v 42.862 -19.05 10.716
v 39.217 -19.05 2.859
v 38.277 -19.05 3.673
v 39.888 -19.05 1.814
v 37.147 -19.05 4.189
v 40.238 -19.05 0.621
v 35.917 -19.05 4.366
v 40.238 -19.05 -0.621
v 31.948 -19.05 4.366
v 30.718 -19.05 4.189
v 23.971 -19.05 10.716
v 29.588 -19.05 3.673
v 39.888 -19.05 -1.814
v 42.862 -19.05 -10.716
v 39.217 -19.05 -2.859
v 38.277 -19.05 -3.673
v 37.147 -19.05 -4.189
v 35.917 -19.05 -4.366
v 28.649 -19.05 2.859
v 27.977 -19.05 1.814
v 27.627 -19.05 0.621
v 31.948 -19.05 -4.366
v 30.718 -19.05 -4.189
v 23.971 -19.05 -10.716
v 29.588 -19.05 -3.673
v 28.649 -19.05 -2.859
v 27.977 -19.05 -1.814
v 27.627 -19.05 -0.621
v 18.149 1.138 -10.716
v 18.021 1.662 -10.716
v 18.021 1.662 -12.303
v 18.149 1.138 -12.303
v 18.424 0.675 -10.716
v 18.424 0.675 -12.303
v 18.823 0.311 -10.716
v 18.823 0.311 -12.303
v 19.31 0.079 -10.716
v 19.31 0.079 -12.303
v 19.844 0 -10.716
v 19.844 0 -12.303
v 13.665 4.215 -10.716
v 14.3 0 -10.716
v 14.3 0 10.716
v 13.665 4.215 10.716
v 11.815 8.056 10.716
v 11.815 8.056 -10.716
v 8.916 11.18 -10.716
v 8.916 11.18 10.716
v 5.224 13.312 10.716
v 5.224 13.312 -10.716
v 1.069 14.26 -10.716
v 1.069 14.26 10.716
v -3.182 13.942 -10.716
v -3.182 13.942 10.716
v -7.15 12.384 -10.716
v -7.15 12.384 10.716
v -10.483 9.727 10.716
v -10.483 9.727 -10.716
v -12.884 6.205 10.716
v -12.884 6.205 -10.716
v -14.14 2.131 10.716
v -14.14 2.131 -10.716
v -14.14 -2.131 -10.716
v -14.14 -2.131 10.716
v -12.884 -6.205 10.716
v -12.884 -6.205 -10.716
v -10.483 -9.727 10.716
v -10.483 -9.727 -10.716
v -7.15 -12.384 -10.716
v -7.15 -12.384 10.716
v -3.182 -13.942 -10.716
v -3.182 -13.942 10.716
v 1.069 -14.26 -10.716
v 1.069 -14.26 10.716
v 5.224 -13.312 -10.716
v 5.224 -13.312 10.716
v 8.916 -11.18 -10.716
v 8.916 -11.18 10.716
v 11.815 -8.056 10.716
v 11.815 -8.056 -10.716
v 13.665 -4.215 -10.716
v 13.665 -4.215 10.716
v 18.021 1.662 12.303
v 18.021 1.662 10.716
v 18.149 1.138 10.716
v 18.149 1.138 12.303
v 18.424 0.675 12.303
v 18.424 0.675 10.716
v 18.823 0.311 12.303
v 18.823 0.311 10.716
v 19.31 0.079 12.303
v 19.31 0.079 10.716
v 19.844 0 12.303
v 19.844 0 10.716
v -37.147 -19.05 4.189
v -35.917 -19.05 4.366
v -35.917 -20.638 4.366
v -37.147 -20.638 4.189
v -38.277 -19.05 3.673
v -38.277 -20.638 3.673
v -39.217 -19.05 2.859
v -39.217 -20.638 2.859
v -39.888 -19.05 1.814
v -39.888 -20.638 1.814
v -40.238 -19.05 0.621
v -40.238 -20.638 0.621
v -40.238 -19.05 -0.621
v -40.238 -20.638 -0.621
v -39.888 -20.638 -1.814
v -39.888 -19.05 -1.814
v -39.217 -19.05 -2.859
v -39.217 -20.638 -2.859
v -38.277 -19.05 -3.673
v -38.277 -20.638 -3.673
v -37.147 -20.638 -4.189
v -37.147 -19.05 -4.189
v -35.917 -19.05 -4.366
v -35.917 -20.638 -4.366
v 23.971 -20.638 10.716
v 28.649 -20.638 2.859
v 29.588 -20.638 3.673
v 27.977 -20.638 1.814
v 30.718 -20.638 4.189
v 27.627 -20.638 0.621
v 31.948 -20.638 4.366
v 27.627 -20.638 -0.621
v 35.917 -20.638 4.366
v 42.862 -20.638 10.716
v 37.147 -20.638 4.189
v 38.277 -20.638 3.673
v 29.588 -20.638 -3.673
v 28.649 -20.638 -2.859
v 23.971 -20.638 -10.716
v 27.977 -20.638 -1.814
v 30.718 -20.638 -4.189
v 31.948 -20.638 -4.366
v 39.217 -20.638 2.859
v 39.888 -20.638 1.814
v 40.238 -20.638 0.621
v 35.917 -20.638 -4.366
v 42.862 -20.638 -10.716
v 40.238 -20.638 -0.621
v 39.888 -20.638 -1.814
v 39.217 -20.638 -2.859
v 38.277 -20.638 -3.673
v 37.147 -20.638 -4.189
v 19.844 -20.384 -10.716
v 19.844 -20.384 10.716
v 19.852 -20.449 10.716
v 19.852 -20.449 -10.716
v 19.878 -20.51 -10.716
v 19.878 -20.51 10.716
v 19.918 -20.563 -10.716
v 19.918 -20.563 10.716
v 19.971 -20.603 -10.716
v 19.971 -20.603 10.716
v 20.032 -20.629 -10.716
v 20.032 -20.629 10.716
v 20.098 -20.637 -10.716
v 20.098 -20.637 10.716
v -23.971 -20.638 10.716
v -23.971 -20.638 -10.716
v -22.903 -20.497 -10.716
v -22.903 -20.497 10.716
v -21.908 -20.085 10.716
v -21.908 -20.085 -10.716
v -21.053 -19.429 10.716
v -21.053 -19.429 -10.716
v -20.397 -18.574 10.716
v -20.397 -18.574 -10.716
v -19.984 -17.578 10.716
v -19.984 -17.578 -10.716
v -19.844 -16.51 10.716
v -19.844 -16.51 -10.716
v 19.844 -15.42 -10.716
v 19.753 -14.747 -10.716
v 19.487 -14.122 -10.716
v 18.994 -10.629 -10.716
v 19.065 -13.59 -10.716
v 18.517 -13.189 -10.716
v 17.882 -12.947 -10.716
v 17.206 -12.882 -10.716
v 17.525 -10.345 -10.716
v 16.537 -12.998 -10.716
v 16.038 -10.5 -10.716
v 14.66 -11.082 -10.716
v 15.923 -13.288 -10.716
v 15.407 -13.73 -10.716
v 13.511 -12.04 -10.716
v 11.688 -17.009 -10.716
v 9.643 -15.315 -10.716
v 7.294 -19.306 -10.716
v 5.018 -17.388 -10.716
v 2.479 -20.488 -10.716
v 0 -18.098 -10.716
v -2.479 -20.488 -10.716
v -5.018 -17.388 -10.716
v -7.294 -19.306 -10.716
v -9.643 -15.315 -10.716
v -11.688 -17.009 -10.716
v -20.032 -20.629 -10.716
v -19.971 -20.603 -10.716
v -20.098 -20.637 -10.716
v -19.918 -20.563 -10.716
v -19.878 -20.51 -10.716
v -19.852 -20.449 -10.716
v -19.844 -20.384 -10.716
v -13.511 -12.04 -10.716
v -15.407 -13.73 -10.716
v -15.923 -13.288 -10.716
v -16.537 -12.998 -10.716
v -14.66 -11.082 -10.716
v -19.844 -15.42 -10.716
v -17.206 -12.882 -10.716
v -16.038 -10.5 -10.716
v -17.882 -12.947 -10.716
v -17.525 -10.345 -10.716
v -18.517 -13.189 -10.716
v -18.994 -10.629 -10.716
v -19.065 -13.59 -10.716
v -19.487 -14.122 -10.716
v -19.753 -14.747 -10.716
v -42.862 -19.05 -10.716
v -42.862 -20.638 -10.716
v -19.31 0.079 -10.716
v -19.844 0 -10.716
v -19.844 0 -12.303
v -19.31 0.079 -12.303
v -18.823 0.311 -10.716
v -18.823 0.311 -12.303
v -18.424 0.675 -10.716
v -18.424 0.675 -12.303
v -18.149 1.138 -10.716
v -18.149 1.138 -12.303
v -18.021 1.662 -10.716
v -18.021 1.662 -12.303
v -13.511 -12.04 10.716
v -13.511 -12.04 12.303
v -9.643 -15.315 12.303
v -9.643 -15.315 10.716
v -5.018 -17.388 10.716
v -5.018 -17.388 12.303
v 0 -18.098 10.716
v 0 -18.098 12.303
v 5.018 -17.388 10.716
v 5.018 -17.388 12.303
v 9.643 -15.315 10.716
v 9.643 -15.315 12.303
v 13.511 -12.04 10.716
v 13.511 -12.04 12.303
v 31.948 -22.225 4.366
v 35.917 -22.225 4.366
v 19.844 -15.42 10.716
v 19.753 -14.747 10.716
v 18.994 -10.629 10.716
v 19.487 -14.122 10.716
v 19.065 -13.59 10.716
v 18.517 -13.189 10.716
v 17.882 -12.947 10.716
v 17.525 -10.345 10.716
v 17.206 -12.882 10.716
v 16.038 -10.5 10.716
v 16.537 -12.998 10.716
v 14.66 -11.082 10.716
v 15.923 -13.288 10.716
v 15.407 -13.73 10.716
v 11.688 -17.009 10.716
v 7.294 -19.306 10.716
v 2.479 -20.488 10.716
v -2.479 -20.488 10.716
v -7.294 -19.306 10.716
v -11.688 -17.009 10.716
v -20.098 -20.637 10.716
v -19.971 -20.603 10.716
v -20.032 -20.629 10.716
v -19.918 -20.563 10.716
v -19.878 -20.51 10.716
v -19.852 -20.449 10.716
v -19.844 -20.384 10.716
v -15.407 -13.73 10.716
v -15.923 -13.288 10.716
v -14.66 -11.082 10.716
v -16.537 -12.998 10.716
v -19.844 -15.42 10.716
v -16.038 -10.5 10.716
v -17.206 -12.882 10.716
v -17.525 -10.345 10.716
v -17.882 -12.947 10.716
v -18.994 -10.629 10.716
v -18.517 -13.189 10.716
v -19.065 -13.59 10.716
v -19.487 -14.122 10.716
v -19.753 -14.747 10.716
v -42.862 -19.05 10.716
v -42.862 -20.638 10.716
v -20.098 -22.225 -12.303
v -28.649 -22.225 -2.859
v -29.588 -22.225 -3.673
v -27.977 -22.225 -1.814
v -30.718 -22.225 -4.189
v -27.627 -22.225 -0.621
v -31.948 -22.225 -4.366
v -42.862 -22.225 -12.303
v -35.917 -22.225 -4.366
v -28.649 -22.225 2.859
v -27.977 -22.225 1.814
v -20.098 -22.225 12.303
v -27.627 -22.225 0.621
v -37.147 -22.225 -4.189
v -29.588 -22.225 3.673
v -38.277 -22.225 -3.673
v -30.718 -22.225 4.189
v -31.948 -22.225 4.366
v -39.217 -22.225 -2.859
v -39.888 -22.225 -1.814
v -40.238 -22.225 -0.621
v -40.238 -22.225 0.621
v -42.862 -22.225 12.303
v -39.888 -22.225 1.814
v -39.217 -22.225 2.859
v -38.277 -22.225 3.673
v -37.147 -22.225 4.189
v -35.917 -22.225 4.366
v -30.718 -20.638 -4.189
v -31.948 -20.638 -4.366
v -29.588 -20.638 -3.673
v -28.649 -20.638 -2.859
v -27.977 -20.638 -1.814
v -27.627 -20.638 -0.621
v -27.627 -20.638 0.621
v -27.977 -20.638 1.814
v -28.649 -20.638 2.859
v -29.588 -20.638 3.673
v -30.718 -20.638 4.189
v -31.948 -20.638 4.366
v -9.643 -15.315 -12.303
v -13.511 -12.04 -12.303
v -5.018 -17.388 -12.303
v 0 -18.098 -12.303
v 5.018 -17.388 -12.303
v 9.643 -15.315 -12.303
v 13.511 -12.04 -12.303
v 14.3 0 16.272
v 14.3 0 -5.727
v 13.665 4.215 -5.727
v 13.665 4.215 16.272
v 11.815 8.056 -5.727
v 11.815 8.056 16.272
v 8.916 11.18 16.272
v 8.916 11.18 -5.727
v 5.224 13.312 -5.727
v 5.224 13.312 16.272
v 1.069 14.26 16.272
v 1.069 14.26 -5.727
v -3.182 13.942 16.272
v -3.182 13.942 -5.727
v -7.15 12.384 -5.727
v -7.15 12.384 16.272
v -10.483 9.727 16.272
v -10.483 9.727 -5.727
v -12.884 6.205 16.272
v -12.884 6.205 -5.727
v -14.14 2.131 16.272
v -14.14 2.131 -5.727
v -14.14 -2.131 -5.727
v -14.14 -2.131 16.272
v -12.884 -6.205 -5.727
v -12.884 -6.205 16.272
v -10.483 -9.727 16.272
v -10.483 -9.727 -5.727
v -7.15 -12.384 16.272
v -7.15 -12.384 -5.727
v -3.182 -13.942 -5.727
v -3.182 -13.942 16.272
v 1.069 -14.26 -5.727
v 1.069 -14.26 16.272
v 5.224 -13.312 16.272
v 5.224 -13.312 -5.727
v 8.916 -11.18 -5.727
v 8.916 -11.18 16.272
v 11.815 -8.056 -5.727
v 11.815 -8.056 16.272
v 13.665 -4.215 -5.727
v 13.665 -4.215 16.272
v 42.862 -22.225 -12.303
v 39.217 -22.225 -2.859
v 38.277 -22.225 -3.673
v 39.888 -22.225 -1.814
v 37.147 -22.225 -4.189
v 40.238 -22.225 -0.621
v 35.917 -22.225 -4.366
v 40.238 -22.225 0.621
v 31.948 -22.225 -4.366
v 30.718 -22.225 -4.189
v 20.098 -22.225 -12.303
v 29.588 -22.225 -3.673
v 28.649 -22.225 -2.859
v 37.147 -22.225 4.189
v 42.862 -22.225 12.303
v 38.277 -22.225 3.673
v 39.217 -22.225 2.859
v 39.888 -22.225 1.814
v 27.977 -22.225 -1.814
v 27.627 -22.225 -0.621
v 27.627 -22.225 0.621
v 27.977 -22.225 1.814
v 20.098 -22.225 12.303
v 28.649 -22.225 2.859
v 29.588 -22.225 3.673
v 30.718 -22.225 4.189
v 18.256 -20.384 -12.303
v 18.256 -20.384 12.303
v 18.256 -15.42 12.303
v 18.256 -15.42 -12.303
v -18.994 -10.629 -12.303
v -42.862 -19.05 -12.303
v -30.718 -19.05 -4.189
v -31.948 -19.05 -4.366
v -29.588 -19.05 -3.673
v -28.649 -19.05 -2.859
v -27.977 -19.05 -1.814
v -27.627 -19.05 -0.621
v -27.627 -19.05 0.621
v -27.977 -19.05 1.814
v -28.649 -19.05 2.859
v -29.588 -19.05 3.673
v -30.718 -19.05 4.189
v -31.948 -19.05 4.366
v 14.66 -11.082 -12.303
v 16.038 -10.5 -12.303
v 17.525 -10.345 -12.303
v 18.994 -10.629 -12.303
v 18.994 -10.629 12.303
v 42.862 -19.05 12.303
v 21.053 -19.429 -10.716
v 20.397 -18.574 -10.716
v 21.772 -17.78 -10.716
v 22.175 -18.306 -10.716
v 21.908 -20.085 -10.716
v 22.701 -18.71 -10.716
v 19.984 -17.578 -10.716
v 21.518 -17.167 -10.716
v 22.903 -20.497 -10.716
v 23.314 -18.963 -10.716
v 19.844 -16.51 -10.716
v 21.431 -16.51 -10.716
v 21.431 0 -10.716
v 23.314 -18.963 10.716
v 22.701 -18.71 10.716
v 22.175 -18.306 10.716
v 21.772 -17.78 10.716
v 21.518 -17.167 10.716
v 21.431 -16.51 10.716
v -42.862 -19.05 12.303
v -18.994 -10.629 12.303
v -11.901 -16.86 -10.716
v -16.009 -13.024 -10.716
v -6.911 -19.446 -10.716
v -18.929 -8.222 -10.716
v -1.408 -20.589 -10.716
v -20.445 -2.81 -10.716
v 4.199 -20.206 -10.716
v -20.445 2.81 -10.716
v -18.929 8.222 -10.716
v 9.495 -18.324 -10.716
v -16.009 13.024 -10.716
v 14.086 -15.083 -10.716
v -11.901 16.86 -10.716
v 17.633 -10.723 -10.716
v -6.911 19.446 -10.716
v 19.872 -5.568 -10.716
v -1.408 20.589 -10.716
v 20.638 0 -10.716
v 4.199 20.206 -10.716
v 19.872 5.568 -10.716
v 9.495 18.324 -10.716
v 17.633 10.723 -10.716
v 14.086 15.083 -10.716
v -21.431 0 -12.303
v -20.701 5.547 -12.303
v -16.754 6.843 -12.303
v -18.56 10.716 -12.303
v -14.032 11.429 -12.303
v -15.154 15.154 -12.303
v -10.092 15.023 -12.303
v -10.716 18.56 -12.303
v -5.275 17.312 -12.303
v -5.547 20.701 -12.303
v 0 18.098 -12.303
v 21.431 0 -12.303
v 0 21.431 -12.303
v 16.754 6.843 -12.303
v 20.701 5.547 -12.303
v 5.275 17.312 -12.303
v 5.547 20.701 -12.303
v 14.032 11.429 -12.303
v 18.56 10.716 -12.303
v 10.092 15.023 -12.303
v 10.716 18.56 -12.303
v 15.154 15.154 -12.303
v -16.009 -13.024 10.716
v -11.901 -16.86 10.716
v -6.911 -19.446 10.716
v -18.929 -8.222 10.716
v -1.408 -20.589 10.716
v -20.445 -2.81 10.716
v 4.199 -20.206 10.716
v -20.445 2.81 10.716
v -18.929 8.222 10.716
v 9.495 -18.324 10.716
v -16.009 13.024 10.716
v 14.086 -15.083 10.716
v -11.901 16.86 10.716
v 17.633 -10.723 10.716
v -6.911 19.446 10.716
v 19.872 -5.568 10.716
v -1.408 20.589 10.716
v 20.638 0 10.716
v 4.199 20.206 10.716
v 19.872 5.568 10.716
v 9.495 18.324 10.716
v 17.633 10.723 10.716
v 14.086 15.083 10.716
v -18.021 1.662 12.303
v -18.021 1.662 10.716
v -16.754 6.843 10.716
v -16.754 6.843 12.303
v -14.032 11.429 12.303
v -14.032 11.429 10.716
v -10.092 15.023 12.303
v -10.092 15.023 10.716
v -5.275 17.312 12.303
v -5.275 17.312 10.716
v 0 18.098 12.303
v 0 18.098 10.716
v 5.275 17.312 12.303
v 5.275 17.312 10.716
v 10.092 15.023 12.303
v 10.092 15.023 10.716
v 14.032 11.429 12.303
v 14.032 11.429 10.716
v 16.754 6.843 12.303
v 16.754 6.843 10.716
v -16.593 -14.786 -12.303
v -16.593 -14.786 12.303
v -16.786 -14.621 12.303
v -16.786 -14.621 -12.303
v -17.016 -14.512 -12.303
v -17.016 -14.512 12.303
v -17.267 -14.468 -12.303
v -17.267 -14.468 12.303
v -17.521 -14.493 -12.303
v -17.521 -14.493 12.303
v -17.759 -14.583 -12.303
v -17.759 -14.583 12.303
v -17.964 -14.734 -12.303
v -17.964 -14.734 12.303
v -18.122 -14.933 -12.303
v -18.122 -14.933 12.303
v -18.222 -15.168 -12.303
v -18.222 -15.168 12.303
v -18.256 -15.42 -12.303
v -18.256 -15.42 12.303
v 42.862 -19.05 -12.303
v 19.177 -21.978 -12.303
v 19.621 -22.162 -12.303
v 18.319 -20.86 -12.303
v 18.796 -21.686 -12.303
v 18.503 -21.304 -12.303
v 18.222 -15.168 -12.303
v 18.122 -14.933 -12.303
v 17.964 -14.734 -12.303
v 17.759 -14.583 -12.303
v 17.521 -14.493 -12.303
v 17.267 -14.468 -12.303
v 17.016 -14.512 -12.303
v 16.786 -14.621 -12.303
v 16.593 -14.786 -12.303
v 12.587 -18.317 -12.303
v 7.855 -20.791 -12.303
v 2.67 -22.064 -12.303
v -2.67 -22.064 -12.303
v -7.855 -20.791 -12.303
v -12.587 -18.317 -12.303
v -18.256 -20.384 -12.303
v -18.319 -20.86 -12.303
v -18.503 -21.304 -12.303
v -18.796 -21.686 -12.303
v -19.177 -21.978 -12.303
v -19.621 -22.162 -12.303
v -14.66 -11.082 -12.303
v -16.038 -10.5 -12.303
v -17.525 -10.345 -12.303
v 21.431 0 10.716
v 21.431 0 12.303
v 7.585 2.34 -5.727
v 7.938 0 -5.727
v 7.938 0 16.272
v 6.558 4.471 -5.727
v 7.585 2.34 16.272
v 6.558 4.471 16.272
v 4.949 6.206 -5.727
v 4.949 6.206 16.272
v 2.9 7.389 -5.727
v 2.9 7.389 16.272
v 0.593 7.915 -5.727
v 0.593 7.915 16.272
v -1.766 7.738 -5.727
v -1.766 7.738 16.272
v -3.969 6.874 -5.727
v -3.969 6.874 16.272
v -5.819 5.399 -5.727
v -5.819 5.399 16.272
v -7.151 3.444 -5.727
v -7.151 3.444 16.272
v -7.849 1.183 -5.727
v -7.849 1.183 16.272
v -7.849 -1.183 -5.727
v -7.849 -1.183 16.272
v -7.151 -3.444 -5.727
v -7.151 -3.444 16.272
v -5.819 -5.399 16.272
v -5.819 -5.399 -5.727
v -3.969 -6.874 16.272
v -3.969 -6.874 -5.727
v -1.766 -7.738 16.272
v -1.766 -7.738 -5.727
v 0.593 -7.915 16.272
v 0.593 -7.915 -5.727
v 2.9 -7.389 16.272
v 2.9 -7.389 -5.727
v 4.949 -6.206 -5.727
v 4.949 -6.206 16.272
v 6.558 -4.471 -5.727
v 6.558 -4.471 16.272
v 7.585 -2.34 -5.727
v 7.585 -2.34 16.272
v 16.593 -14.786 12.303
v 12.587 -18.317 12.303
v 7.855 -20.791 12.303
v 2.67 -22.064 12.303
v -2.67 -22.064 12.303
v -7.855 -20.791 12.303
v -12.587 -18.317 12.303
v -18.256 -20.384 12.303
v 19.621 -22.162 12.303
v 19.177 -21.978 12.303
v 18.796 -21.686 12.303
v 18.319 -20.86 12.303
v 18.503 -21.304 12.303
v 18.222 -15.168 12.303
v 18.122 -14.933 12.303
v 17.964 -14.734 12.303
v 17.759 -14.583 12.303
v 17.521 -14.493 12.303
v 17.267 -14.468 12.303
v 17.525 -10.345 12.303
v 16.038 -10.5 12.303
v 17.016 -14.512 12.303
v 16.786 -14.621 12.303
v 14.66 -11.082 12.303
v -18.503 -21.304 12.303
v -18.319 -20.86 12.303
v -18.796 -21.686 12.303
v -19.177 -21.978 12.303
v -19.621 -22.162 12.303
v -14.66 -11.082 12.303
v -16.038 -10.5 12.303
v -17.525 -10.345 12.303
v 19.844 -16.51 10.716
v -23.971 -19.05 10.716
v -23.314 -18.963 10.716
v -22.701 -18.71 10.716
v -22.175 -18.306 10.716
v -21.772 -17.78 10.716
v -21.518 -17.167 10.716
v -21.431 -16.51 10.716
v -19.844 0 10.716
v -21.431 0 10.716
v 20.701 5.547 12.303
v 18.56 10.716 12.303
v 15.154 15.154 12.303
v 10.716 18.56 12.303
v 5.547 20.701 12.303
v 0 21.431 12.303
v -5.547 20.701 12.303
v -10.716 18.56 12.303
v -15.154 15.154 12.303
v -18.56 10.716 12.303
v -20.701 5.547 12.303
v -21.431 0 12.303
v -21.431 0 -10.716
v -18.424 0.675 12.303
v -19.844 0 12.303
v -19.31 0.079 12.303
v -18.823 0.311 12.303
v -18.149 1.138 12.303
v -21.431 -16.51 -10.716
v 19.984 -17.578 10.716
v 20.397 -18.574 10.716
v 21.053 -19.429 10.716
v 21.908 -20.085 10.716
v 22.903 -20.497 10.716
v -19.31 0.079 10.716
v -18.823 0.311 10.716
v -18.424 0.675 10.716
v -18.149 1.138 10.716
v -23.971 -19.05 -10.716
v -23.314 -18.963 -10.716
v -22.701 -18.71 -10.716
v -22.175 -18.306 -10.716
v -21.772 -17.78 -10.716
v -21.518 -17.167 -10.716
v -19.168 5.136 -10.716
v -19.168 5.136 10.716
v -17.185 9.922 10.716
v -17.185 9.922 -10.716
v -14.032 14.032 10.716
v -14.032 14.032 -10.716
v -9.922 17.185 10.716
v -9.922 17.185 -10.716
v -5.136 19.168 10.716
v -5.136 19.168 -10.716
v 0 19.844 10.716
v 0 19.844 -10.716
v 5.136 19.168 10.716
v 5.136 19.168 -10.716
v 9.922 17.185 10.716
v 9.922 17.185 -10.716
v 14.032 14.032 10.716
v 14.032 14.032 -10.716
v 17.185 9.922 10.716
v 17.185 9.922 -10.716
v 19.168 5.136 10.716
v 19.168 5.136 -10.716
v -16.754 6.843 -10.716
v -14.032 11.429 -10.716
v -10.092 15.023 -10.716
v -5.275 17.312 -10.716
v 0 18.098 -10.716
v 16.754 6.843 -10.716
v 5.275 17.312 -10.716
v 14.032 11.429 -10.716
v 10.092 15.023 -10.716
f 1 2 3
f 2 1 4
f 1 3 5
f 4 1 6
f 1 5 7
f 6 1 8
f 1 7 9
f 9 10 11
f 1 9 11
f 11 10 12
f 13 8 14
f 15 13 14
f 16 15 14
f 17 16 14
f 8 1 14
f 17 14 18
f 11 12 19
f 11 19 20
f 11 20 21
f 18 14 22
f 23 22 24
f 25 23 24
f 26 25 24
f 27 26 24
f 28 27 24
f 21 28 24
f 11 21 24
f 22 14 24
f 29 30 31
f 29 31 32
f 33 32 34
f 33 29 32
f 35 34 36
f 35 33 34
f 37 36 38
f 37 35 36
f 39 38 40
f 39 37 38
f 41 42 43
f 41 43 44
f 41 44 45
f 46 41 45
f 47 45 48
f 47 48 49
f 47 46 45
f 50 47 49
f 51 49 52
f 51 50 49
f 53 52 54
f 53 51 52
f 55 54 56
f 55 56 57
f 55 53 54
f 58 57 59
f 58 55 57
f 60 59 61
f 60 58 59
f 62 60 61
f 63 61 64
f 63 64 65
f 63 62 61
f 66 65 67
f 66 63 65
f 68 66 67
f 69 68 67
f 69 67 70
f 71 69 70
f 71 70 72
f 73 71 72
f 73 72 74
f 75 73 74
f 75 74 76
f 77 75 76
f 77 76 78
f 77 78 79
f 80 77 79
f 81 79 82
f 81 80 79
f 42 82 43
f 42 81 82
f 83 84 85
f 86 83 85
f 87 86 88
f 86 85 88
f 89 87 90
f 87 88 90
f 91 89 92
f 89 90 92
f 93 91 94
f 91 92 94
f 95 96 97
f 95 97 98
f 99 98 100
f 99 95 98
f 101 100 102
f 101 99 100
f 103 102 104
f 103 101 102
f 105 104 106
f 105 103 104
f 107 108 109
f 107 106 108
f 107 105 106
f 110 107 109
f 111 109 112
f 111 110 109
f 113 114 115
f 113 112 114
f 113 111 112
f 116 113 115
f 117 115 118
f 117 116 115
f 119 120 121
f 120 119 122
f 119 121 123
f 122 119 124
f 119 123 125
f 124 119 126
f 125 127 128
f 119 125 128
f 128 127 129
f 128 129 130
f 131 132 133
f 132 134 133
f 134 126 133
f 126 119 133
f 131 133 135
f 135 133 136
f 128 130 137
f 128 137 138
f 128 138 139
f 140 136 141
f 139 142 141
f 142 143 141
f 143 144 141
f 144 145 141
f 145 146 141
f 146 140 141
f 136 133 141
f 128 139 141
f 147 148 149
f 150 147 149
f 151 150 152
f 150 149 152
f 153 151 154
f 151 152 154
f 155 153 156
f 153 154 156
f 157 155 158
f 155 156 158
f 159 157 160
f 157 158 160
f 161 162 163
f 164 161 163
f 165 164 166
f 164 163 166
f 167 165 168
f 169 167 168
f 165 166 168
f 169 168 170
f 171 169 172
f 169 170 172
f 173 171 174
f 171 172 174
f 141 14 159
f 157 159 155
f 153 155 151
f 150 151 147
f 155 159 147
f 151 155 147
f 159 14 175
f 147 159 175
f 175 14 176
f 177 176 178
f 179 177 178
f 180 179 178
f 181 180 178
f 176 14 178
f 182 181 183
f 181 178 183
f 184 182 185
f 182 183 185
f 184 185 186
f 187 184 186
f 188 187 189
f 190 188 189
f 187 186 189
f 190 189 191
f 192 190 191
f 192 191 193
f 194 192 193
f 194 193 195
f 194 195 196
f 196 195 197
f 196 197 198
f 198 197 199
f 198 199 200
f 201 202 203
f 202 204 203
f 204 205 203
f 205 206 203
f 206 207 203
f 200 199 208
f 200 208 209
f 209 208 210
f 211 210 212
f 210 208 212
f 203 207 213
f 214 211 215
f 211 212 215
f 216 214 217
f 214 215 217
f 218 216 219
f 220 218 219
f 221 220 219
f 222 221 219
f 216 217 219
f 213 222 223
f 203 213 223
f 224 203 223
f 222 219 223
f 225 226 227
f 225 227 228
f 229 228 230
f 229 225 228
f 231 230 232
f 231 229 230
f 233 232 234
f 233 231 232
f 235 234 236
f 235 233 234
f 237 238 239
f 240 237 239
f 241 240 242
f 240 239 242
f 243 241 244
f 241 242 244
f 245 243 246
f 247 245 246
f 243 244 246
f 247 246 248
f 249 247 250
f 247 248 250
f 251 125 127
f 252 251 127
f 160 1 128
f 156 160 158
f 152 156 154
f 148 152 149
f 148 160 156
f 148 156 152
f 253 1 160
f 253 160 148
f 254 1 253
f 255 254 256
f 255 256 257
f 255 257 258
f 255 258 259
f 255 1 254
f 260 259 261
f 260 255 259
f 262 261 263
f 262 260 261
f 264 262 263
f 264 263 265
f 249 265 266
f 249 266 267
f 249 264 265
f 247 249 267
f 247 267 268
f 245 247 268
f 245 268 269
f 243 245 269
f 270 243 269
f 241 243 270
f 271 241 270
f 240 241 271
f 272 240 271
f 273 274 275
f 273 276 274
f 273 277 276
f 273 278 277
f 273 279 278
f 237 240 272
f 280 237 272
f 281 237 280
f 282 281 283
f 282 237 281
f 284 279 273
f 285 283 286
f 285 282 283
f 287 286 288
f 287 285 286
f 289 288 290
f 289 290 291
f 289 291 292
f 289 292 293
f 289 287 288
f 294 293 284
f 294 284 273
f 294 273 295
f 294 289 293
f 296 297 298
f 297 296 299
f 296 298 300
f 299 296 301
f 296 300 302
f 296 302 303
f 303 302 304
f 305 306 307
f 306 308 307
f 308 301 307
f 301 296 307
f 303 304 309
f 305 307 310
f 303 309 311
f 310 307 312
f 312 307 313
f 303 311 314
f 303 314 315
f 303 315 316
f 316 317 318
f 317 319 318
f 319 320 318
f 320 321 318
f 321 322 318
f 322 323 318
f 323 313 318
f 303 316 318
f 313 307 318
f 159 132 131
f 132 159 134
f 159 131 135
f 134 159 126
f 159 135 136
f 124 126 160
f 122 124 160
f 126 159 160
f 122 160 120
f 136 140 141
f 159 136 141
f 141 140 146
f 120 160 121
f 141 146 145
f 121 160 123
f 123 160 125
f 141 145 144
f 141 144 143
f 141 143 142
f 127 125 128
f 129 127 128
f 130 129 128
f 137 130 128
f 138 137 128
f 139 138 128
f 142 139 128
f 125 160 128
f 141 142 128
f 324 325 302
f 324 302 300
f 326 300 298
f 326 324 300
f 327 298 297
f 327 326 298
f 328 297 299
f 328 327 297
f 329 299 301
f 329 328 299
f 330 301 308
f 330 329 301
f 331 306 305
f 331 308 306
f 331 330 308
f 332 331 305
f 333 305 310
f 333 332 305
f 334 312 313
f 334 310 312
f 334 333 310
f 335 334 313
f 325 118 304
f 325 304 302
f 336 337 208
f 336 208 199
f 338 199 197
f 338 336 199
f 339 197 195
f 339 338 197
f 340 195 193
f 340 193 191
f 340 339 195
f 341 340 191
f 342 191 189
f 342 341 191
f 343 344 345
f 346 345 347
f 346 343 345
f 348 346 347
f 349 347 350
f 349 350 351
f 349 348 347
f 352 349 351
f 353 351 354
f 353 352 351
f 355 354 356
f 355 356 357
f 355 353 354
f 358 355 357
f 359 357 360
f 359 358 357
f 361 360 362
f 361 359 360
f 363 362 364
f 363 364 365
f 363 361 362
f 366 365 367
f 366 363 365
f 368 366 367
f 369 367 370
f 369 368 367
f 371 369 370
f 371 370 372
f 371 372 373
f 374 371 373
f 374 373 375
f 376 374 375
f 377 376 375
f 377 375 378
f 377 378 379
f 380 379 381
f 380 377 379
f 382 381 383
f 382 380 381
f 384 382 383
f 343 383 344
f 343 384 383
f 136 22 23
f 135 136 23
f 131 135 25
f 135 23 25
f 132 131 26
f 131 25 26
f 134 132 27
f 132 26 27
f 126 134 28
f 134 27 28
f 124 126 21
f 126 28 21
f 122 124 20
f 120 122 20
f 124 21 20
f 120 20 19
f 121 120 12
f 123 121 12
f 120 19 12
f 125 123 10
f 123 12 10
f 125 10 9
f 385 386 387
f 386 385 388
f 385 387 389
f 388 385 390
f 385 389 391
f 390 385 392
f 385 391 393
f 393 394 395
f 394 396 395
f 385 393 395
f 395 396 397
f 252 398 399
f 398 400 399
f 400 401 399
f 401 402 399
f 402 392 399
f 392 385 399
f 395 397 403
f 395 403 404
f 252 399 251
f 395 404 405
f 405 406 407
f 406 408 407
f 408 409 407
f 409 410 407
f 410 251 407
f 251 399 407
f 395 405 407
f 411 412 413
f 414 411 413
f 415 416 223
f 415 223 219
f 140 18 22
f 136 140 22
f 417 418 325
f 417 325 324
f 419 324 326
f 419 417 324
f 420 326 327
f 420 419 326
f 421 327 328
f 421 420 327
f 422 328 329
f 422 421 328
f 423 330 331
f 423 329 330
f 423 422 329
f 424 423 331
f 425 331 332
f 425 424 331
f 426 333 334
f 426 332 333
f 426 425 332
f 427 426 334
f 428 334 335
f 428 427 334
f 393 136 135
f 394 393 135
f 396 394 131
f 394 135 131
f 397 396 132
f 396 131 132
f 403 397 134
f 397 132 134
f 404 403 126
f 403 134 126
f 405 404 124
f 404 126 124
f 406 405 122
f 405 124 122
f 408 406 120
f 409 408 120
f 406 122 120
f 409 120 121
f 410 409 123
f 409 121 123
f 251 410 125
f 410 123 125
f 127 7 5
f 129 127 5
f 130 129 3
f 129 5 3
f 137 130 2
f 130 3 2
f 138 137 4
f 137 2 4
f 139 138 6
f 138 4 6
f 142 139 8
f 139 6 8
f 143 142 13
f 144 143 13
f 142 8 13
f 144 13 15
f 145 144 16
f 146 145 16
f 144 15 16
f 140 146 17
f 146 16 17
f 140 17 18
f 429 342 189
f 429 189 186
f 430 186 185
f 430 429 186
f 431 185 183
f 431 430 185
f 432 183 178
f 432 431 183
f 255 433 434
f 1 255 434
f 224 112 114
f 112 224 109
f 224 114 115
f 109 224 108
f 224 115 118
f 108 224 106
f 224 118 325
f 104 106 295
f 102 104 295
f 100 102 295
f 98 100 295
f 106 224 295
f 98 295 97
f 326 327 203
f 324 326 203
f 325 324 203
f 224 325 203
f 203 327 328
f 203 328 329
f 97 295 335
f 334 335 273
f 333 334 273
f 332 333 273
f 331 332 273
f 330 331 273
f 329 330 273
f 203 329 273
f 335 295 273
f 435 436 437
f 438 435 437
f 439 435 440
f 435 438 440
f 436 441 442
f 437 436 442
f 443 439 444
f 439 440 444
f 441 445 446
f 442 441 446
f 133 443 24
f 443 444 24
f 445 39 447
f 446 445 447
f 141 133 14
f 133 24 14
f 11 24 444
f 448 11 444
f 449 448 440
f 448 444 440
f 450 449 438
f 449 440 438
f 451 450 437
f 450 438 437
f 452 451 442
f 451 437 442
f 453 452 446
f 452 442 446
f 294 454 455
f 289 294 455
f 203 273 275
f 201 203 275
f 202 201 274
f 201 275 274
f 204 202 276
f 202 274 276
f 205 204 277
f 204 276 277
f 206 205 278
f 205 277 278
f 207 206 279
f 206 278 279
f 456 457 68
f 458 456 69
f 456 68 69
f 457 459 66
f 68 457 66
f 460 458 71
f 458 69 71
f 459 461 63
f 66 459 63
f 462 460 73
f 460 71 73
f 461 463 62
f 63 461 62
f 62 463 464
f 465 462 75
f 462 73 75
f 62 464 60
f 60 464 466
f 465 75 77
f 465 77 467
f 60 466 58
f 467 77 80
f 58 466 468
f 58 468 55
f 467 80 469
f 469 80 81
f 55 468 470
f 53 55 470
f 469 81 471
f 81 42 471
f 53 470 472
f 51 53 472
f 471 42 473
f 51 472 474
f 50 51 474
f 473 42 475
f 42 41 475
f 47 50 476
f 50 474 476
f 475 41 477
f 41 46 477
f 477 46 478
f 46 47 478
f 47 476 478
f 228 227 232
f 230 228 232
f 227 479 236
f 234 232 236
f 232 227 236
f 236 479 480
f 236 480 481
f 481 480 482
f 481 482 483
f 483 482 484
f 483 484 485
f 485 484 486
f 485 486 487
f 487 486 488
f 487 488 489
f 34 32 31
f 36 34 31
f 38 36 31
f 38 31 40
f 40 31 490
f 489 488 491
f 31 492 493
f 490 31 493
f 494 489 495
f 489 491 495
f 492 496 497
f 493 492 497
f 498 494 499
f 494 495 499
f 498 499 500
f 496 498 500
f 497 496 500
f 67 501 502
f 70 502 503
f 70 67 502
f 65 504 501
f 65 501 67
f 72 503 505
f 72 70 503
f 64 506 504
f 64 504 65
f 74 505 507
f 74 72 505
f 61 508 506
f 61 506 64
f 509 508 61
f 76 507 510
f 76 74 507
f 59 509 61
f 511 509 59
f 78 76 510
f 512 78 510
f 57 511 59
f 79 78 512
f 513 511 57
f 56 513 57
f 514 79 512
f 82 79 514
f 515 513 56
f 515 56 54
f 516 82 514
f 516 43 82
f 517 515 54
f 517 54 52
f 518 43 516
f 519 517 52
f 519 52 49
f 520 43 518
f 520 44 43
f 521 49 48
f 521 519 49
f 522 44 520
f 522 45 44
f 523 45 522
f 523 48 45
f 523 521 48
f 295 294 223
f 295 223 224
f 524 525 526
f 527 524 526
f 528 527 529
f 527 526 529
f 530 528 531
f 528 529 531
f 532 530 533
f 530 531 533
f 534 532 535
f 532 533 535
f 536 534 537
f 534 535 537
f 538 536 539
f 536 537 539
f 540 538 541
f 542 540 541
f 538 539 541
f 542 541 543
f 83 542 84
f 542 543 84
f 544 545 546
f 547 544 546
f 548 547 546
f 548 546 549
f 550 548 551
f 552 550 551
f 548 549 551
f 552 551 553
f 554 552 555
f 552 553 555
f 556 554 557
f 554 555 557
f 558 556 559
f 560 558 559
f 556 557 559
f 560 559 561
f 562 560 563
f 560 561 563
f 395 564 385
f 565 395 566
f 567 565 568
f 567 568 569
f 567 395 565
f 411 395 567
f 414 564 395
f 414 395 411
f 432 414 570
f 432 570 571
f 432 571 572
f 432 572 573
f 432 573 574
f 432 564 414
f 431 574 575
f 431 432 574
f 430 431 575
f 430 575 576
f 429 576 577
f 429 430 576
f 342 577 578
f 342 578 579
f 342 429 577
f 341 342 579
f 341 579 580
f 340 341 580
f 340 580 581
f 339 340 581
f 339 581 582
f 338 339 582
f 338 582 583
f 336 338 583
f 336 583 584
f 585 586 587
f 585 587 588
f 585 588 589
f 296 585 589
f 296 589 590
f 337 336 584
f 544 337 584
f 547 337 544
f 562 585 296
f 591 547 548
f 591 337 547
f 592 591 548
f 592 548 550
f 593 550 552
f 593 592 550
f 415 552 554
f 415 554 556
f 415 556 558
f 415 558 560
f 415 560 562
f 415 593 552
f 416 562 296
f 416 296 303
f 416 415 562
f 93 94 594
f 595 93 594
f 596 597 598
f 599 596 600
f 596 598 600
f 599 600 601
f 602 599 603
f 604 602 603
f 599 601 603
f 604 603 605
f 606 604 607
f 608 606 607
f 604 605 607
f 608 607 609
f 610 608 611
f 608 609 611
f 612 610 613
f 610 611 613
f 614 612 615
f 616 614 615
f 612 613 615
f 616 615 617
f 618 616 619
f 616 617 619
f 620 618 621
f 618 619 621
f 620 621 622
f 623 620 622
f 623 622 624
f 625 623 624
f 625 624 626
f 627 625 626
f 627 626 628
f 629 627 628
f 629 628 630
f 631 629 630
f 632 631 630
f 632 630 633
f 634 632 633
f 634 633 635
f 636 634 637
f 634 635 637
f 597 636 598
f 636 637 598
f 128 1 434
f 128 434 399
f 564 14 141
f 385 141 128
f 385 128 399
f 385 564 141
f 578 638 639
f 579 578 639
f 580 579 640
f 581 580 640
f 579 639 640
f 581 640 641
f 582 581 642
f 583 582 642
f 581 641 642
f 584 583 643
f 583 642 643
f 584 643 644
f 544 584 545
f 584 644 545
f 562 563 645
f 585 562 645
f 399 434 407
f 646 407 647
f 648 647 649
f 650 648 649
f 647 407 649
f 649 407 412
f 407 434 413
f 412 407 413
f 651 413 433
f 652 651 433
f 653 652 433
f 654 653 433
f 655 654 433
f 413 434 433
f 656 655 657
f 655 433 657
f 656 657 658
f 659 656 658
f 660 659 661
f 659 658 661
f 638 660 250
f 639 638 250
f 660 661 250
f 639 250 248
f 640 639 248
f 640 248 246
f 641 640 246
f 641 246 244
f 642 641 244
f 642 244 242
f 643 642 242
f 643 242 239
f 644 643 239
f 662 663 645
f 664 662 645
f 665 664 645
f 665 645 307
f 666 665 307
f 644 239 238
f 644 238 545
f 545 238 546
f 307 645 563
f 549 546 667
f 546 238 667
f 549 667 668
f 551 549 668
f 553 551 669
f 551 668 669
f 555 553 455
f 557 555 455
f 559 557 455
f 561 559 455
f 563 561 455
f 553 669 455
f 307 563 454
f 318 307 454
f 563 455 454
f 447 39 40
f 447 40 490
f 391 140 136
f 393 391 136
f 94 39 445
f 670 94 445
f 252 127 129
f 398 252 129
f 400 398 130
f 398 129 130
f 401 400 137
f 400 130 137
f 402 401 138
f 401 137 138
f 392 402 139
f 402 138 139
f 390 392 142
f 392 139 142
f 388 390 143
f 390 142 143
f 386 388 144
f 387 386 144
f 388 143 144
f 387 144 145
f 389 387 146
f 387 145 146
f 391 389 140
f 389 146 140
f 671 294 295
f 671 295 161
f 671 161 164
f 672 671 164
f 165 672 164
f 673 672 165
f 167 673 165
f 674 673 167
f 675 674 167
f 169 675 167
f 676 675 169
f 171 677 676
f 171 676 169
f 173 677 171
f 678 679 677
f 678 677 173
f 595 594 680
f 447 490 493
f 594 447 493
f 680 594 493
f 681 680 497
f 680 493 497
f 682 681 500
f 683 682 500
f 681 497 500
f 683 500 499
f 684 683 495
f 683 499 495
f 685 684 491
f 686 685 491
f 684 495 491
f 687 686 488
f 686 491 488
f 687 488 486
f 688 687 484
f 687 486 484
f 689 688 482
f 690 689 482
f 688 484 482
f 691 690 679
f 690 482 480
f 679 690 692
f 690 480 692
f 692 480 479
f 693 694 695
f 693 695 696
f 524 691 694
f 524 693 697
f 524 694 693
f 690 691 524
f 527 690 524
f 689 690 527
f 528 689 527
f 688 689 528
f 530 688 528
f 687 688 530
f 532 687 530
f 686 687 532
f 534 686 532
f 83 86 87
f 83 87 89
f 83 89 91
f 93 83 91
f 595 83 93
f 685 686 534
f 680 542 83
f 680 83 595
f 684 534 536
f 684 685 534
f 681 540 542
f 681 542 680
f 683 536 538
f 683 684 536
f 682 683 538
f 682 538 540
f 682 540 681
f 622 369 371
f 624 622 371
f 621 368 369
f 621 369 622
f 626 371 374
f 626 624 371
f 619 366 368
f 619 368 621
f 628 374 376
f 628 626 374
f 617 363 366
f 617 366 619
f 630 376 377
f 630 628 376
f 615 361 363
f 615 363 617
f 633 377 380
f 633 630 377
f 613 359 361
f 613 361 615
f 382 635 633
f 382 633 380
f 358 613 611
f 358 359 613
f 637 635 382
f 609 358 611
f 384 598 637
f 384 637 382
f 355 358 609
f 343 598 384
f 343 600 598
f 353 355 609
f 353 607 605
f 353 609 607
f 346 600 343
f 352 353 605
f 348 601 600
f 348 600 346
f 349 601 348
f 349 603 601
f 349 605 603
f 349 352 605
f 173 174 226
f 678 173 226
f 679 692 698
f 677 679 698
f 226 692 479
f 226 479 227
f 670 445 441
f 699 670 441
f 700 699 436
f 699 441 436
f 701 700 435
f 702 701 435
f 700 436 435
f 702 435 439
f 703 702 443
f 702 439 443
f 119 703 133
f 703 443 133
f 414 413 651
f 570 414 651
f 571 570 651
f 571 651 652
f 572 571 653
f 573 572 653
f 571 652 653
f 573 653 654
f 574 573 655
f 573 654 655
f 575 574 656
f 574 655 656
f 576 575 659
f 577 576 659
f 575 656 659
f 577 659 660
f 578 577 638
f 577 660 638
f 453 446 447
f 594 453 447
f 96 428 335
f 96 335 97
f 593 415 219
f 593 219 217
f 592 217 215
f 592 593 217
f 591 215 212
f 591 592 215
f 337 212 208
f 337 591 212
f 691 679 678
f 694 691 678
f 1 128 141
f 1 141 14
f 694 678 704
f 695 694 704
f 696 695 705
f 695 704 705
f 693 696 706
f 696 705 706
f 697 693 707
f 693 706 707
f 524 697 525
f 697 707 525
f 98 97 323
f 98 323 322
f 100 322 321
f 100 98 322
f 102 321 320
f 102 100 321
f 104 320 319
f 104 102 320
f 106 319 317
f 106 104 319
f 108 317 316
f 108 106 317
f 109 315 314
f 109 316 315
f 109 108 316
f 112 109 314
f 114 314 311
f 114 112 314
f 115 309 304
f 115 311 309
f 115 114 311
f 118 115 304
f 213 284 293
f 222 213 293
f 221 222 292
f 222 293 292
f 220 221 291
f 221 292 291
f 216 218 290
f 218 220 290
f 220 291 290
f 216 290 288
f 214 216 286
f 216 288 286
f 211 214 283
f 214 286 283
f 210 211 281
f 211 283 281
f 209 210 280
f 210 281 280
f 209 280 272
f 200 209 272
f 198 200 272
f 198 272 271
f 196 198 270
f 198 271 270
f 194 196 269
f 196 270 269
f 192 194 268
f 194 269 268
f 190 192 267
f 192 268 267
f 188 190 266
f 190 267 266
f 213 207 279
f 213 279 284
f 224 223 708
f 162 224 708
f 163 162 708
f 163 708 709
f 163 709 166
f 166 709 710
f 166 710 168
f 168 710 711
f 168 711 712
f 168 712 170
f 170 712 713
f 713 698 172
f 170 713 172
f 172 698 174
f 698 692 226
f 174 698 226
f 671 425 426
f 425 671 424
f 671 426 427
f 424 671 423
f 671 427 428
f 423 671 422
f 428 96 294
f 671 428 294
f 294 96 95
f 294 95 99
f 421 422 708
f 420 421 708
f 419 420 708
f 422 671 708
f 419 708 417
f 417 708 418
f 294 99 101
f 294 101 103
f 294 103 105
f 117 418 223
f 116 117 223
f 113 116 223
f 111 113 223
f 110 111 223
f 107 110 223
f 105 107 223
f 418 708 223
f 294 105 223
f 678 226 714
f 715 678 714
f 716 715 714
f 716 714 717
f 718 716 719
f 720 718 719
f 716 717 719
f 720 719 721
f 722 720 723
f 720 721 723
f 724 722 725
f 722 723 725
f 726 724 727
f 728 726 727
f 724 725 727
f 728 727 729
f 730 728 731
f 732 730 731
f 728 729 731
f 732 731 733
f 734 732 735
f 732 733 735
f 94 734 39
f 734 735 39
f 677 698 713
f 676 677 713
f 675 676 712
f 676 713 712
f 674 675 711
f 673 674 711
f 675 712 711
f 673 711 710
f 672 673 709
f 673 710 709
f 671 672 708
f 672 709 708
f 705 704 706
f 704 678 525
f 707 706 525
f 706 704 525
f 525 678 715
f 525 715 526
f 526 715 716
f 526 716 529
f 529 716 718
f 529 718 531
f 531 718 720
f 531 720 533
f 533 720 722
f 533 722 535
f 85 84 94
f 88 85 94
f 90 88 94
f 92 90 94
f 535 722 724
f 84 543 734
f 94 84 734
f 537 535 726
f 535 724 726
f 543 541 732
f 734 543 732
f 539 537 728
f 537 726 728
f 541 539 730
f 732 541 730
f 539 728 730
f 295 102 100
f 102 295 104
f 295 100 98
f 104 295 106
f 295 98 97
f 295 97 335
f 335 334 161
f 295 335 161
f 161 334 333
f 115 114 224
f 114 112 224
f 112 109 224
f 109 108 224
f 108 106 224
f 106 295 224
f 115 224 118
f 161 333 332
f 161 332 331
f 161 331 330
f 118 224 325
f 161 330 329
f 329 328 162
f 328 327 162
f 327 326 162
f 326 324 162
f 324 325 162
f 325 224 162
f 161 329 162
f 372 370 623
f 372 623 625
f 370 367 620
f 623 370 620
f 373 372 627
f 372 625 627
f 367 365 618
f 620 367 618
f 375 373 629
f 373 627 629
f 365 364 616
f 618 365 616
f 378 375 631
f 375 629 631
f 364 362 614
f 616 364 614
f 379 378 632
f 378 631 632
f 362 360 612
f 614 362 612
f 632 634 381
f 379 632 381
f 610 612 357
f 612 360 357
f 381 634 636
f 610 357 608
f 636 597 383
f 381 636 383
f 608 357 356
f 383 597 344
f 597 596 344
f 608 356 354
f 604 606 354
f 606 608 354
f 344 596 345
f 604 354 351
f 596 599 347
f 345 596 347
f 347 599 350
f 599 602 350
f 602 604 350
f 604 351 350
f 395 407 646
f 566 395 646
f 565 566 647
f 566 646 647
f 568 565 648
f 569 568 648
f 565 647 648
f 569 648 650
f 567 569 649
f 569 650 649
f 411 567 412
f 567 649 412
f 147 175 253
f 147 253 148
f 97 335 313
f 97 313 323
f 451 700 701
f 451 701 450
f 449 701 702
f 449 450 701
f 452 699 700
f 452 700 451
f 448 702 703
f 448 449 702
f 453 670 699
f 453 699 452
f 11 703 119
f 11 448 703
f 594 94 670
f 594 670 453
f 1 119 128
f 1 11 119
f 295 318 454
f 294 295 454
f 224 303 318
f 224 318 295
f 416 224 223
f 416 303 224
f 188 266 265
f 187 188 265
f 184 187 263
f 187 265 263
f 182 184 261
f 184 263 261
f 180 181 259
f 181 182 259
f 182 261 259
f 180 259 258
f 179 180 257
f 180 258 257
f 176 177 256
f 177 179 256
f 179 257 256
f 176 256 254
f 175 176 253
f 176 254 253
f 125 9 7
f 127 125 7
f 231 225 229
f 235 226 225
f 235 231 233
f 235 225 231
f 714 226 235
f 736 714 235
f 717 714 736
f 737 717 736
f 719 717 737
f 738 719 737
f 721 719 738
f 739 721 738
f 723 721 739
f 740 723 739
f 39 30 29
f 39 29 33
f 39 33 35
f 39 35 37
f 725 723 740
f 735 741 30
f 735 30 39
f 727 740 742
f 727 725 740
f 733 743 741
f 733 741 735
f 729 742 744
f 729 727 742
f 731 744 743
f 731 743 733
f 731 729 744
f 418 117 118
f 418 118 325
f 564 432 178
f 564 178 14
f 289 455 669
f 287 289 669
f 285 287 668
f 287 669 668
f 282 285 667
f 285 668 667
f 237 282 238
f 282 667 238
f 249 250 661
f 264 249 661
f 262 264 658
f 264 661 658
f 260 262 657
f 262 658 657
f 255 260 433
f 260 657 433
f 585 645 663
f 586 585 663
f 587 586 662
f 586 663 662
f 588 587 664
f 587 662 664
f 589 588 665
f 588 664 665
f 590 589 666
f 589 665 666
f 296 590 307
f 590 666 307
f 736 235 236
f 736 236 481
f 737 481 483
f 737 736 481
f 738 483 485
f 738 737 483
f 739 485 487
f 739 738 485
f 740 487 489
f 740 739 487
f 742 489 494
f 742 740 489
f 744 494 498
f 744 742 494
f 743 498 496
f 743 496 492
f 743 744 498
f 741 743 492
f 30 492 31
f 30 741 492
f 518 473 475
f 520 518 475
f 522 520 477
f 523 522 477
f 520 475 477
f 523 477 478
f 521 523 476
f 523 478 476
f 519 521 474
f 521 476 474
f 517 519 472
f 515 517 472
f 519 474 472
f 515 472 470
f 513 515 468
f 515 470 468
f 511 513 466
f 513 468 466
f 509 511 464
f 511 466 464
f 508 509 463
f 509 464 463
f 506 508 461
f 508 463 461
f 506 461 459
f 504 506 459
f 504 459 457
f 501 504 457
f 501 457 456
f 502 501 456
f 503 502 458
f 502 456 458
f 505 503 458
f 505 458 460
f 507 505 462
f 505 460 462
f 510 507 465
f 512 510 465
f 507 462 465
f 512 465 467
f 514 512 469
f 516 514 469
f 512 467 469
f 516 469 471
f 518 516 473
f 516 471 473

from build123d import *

# Parameters (mm, degrees)
EXTRUDE_THIN2_DEPTH  = 12.303125
EXTRUDE1_DEPTH       = 1.5875
EXTRUDE_THIN3_START  = -10.715625
EXTRUDE_THIN3_DEPTH  = 21.43125
EXTRUDE2_DEPTH       = 1.5875
EXTRUDE3_START       = -10.715625
EXTRUDE3_OUTLINE_R   = 20.6375
EXTRUDE3_OUTLINE_R_2 = 14.3002
EXTRUDE3_DEPTH       = 21.43125
SKETCH8_R            = 14.3002
SKETCH8_R_2          = 7.9375
EXTRUDE4_DEPTH       = 21.99894
CUT_EXTRUDE1_DEPTH   = 51.950156499


# Read off the part's stored shape, not the designer's step: Extrude-Thin3, Extrude3
with BuildPart() as part:
    # Sketch1 → Extrude-Thin2 (new, symmetric)
    with BuildSketch(Plane.XY):
        with BuildLine():
            Line((-42.8625, -20.6375), (-20.09775, -20.6375))
            ThreePointArc((-20.09775, -20.6375), (-19.918144878, -20.563105122), (-19.84375, -20.3835))
            Line((-19.84375, -20.3835), (-19.84375, -15.420011096))
            ThreePointArc((-19.84375, -15.420011096), (-18.207905551, -13.0463846), (-15.40744863, -13.730146866))
            ThreePointArc((-15.40744863, -13.730146866), (0, -20.6375), (15.40744863, -13.730146866))
            ThreePointArc((15.40744863, -13.730146866), (18.207905551, -13.0463846), (19.84375, -15.420011096))
            Line((19.84375, -15.420011096), (19.84375, -20.3835))
            ThreePointArc((19.84375, -20.3835), (19.918144878, -20.563105122), (20.09775, -20.6375))
            Line((20.09775, -20.6375), (42.8625, -20.6375))
            Line((42.8625, -20.6375), (42.8625, -22.225))
            Line((42.8625, -22.225), (20.09775, -22.225))
            ThreePointArc((20.09775, -22.225), (18.795612862, -21.685637138), (18.25625, -20.3835))
            Line((18.25625, -20.3835), (18.25625, -15.420011096))
            ThreePointArc((18.25625, -15.420011096), (17.642808332, -14.52990116), (16.592636986, -14.786312009))
            ThreePointArc((16.592636986, -14.786312009), (0, -22.225), (-16.592636986, -14.786312009))
            ThreePointArc((-16.592636986, -14.786312009), (-17.642808332, -14.52990116), (-18.25625, -15.420011096))
            Line((-18.25625, -15.420011096), (-18.25625, -20.3835))
            ThreePointArc((-18.25625, -20.3835), (-18.795612862, -21.685637138), (-20.09775, -22.225))
            Line((-20.09775, -22.225), (-42.8625, -22.225))
            Line((-42.8625, -22.225), (-42.8625, -20.6375))
        make_face()
    extrude(amount=EXTRUDE_THIN2_DEPTH, both=True)

    # Sketch4 → Extrude1 (add)
    with BuildSketch(Plane.XY.offset(12.303125)):
        with BuildLine():
            Line((-42.8625, -19.05), (-18.993828558, -10.629391671))
            ThreePointArc((-18.993828558, -10.629391671), (-16.037730525, -10.500296197), (-13.51114726, -12.040282636))
            ThreePointArc((-13.51114726, -12.040282636), (0, -18.0975), (13.51114726, -12.040282636))
            ThreePointArc((13.51114726, -12.040282636), (16.037730525, -10.500296197), (18.993828558, -10.629391671))
            Line((18.993828558, -10.629391671), (42.8625, -19.05))
            Line((42.8625, -19.05), (42.8625, -22.225))
            Line((42.8625, -22.225), (20.09775, -22.225))
            ThreePointArc((20.09775, -22.225), (18.795612862, -21.685637138), (18.25625, -20.3835))
            Line((18.25625, -20.3835), (18.25625, -15.420011096))
            ThreePointArc((18.25625, -15.420011096), (17.642808332, -14.52990116), (16.592636986, -14.786312009))
            ThreePointArc((16.592636986, -14.786312009), (0, -22.225), (-16.592636986, -14.786312009))
            ThreePointArc((-16.592636986, -14.786312009), (-17.642808332, -14.52990116), (-18.25625, -15.420011096))
            Line((-18.25625, -15.420011096), (-18.25625, -20.3835))
            ThreePointArc((-18.25625, -20.3835), (-18.795612862, -21.685637138), (-20.09775, -22.225))
            Line((-20.09775, -22.225), (-42.8625, -22.225))
            Line((-42.8625, -22.225), (-42.8625, -19.05))
        make_face()
    extrude1 = extrude(amount=-EXTRUDE1_DEPTH)

    # Mirror1: Extrude1 across plane
    add(extrude1.mirror(Plane.XY))


with BuildPart() as body_2:
    # Extrude-Thin3 outline → Extrude-Thin3 (new body)
    with BuildSketch(Plane.XY.offset(EXTRUDE_THIN3_START)):
        with BuildLine():
            Line((-23.97125, -19.05), (-42.8625, -19.05))
            Line((-42.8625, -19.05), (-42.8625, -20.6375))
            Line((-42.8625, -20.6375), (-23.97125, -20.6375))
            ThreePointArc((-23.97125, -20.6375), (-21.052666761, -19.428583239), (-19.84375, -16.51))
            Line((-19.84375, -16.51), (-19.84375, 0))
            ThreePointArc((-19.84375, 0), (0, 19.84375), (19.84375, 0))
            Line((19.84375, 0), (19.84375, -16.51))
            ThreePointArc((19.84375, -16.51), (21.052666761, -19.428583239), (23.97125, -20.6375))
            Line((23.97125, -20.6375), (42.8625, -20.6375))
            Line((42.8625, -20.6375), (42.8625, -19.05))
            Line((42.8625, -19.05), (23.97125, -19.05))
            ThreePointArc((23.97125, -19.05), (22.175198776, -18.306051224), (21.43125, -16.51))
            Line((21.43125, -16.51), (21.43125, 0))
            ThreePointArc((21.43125, 0), (0, 21.43125), (-21.43125, 0))
            Line((-21.43125, 0), (-21.43125, -16.51))
            ThreePointArc((-21.43125, -16.51), (-22.175198776, -18.306051224), (-23.97125, -19.05))
        make_face()
    extrude(amount=EXTRUDE_THIN3_DEPTH)

    # Sketch6 → Extrude2 (add)
    with BuildSketch(Plane(origin=(0, 0, -10.715625), x_dir=(-1, 0, 0), z_dir=(0, 0, -1))):
        with BuildLine():
            Line((-19.84375, 0), (-21.43125, 0))
            ThreePointArc((-21.43125, 0), (0, 21.43125), (21.43125, 0))
            Line((21.43125, 0), (19.84375, 0))
            ThreePointArc((19.84375, 0), (18.610270538, 0.477999494), (18.020989833, 1.662357273))
            ThreePointArc((18.020989833, 1.662357273), (0, 18.0975), (-18.020989833, 1.662357273))
            ThreePointArc((-18.020989833, 1.662357273), (-18.610270538, 0.477999494), (-19.84375, 0))
        make_face()
    extrude2 = extrude(amount=EXTRUDE2_DEPTH)

    # Mirror2: Extrude2 across plane
    add(extrude2.mirror(Plane.XY))


with BuildPart() as body_3:
    # Extrude3 outline → Extrude3 (new body)
    with BuildSketch(Plane.XY.offset(EXTRUDE3_START)):
        Circle(EXTRUDE3_OUTLINE_R)
        Circle(EXTRUDE3_OUTLINE_R_2, mode=Mode.SUBTRACT)
    extrude(amount=EXTRUDE3_DEPTH)


with BuildPart() as body_4:
    # Sketch8 → Extrude4 (new body)
    with BuildSketch(Plane.XY.offset(16.271875)):
        Circle(SKETCH8_R)
        Circle(SKETCH8_R_2, mode=Mode.SUBTRACT)
    extrude(amount=-EXTRUDE4_DEPTH)


with BuildPart() as cut_extrude1_tool:
    # Sketch3 → Cut-Extrude1 (new, through all)
    with BuildSketch(Plane(origin=(0, 0, 0), x_dir=(1, 0, 0), z_dir=(0, 1, 0))):
        with BuildLine():
            Line((-35.9171875, 4.365625), (-31.9484375, 4.365625))
            ThreePointArc((-31.9484375, 4.365625), (-27.5828125, 0), (-31.9484375, -4.365625))
            Line((-31.9484375, -4.365625), (-35.9171875, -4.365625))
            ThreePointArc((-35.9171875, -4.365625), (-40.2828125, 0), (-35.9171875, 4.365625))
        make_face()
        with BuildLine():
            Line((31.9484375, -4.365625), (35.9171875, -4.365625))
            ThreePointArc((35.9171875, -4.365625), (40.2828125, 0), (35.9171875, 4.365625))
            Line((35.9171875, 4.365625), (31.9484375, 4.365625))
            ThreePointArc((31.9484375, 4.365625), (27.5828125, 0), (31.9484375, -4.365625))
        make_face()
    extrude(amount=-CUT_EXTRUDE1_DEPTH)


with BuildPart() as part_1:
    add(part.part)

    # Cut-Extrude1: cut by cut_extrude1_tool
    add(cut_extrude1_tool.part, mode=Mode.SUBTRACT)


with BuildPart() as body_2_1:
    add(body_2.part)

    # Cut-Extrude1: cut by cut_extrude1_tool
    add(cut_extrude1_tool.part, mode=Mode.SUBTRACT)


solid = Compound([body_3.part, body_4.part, part_1.part, body_2_1.part])
